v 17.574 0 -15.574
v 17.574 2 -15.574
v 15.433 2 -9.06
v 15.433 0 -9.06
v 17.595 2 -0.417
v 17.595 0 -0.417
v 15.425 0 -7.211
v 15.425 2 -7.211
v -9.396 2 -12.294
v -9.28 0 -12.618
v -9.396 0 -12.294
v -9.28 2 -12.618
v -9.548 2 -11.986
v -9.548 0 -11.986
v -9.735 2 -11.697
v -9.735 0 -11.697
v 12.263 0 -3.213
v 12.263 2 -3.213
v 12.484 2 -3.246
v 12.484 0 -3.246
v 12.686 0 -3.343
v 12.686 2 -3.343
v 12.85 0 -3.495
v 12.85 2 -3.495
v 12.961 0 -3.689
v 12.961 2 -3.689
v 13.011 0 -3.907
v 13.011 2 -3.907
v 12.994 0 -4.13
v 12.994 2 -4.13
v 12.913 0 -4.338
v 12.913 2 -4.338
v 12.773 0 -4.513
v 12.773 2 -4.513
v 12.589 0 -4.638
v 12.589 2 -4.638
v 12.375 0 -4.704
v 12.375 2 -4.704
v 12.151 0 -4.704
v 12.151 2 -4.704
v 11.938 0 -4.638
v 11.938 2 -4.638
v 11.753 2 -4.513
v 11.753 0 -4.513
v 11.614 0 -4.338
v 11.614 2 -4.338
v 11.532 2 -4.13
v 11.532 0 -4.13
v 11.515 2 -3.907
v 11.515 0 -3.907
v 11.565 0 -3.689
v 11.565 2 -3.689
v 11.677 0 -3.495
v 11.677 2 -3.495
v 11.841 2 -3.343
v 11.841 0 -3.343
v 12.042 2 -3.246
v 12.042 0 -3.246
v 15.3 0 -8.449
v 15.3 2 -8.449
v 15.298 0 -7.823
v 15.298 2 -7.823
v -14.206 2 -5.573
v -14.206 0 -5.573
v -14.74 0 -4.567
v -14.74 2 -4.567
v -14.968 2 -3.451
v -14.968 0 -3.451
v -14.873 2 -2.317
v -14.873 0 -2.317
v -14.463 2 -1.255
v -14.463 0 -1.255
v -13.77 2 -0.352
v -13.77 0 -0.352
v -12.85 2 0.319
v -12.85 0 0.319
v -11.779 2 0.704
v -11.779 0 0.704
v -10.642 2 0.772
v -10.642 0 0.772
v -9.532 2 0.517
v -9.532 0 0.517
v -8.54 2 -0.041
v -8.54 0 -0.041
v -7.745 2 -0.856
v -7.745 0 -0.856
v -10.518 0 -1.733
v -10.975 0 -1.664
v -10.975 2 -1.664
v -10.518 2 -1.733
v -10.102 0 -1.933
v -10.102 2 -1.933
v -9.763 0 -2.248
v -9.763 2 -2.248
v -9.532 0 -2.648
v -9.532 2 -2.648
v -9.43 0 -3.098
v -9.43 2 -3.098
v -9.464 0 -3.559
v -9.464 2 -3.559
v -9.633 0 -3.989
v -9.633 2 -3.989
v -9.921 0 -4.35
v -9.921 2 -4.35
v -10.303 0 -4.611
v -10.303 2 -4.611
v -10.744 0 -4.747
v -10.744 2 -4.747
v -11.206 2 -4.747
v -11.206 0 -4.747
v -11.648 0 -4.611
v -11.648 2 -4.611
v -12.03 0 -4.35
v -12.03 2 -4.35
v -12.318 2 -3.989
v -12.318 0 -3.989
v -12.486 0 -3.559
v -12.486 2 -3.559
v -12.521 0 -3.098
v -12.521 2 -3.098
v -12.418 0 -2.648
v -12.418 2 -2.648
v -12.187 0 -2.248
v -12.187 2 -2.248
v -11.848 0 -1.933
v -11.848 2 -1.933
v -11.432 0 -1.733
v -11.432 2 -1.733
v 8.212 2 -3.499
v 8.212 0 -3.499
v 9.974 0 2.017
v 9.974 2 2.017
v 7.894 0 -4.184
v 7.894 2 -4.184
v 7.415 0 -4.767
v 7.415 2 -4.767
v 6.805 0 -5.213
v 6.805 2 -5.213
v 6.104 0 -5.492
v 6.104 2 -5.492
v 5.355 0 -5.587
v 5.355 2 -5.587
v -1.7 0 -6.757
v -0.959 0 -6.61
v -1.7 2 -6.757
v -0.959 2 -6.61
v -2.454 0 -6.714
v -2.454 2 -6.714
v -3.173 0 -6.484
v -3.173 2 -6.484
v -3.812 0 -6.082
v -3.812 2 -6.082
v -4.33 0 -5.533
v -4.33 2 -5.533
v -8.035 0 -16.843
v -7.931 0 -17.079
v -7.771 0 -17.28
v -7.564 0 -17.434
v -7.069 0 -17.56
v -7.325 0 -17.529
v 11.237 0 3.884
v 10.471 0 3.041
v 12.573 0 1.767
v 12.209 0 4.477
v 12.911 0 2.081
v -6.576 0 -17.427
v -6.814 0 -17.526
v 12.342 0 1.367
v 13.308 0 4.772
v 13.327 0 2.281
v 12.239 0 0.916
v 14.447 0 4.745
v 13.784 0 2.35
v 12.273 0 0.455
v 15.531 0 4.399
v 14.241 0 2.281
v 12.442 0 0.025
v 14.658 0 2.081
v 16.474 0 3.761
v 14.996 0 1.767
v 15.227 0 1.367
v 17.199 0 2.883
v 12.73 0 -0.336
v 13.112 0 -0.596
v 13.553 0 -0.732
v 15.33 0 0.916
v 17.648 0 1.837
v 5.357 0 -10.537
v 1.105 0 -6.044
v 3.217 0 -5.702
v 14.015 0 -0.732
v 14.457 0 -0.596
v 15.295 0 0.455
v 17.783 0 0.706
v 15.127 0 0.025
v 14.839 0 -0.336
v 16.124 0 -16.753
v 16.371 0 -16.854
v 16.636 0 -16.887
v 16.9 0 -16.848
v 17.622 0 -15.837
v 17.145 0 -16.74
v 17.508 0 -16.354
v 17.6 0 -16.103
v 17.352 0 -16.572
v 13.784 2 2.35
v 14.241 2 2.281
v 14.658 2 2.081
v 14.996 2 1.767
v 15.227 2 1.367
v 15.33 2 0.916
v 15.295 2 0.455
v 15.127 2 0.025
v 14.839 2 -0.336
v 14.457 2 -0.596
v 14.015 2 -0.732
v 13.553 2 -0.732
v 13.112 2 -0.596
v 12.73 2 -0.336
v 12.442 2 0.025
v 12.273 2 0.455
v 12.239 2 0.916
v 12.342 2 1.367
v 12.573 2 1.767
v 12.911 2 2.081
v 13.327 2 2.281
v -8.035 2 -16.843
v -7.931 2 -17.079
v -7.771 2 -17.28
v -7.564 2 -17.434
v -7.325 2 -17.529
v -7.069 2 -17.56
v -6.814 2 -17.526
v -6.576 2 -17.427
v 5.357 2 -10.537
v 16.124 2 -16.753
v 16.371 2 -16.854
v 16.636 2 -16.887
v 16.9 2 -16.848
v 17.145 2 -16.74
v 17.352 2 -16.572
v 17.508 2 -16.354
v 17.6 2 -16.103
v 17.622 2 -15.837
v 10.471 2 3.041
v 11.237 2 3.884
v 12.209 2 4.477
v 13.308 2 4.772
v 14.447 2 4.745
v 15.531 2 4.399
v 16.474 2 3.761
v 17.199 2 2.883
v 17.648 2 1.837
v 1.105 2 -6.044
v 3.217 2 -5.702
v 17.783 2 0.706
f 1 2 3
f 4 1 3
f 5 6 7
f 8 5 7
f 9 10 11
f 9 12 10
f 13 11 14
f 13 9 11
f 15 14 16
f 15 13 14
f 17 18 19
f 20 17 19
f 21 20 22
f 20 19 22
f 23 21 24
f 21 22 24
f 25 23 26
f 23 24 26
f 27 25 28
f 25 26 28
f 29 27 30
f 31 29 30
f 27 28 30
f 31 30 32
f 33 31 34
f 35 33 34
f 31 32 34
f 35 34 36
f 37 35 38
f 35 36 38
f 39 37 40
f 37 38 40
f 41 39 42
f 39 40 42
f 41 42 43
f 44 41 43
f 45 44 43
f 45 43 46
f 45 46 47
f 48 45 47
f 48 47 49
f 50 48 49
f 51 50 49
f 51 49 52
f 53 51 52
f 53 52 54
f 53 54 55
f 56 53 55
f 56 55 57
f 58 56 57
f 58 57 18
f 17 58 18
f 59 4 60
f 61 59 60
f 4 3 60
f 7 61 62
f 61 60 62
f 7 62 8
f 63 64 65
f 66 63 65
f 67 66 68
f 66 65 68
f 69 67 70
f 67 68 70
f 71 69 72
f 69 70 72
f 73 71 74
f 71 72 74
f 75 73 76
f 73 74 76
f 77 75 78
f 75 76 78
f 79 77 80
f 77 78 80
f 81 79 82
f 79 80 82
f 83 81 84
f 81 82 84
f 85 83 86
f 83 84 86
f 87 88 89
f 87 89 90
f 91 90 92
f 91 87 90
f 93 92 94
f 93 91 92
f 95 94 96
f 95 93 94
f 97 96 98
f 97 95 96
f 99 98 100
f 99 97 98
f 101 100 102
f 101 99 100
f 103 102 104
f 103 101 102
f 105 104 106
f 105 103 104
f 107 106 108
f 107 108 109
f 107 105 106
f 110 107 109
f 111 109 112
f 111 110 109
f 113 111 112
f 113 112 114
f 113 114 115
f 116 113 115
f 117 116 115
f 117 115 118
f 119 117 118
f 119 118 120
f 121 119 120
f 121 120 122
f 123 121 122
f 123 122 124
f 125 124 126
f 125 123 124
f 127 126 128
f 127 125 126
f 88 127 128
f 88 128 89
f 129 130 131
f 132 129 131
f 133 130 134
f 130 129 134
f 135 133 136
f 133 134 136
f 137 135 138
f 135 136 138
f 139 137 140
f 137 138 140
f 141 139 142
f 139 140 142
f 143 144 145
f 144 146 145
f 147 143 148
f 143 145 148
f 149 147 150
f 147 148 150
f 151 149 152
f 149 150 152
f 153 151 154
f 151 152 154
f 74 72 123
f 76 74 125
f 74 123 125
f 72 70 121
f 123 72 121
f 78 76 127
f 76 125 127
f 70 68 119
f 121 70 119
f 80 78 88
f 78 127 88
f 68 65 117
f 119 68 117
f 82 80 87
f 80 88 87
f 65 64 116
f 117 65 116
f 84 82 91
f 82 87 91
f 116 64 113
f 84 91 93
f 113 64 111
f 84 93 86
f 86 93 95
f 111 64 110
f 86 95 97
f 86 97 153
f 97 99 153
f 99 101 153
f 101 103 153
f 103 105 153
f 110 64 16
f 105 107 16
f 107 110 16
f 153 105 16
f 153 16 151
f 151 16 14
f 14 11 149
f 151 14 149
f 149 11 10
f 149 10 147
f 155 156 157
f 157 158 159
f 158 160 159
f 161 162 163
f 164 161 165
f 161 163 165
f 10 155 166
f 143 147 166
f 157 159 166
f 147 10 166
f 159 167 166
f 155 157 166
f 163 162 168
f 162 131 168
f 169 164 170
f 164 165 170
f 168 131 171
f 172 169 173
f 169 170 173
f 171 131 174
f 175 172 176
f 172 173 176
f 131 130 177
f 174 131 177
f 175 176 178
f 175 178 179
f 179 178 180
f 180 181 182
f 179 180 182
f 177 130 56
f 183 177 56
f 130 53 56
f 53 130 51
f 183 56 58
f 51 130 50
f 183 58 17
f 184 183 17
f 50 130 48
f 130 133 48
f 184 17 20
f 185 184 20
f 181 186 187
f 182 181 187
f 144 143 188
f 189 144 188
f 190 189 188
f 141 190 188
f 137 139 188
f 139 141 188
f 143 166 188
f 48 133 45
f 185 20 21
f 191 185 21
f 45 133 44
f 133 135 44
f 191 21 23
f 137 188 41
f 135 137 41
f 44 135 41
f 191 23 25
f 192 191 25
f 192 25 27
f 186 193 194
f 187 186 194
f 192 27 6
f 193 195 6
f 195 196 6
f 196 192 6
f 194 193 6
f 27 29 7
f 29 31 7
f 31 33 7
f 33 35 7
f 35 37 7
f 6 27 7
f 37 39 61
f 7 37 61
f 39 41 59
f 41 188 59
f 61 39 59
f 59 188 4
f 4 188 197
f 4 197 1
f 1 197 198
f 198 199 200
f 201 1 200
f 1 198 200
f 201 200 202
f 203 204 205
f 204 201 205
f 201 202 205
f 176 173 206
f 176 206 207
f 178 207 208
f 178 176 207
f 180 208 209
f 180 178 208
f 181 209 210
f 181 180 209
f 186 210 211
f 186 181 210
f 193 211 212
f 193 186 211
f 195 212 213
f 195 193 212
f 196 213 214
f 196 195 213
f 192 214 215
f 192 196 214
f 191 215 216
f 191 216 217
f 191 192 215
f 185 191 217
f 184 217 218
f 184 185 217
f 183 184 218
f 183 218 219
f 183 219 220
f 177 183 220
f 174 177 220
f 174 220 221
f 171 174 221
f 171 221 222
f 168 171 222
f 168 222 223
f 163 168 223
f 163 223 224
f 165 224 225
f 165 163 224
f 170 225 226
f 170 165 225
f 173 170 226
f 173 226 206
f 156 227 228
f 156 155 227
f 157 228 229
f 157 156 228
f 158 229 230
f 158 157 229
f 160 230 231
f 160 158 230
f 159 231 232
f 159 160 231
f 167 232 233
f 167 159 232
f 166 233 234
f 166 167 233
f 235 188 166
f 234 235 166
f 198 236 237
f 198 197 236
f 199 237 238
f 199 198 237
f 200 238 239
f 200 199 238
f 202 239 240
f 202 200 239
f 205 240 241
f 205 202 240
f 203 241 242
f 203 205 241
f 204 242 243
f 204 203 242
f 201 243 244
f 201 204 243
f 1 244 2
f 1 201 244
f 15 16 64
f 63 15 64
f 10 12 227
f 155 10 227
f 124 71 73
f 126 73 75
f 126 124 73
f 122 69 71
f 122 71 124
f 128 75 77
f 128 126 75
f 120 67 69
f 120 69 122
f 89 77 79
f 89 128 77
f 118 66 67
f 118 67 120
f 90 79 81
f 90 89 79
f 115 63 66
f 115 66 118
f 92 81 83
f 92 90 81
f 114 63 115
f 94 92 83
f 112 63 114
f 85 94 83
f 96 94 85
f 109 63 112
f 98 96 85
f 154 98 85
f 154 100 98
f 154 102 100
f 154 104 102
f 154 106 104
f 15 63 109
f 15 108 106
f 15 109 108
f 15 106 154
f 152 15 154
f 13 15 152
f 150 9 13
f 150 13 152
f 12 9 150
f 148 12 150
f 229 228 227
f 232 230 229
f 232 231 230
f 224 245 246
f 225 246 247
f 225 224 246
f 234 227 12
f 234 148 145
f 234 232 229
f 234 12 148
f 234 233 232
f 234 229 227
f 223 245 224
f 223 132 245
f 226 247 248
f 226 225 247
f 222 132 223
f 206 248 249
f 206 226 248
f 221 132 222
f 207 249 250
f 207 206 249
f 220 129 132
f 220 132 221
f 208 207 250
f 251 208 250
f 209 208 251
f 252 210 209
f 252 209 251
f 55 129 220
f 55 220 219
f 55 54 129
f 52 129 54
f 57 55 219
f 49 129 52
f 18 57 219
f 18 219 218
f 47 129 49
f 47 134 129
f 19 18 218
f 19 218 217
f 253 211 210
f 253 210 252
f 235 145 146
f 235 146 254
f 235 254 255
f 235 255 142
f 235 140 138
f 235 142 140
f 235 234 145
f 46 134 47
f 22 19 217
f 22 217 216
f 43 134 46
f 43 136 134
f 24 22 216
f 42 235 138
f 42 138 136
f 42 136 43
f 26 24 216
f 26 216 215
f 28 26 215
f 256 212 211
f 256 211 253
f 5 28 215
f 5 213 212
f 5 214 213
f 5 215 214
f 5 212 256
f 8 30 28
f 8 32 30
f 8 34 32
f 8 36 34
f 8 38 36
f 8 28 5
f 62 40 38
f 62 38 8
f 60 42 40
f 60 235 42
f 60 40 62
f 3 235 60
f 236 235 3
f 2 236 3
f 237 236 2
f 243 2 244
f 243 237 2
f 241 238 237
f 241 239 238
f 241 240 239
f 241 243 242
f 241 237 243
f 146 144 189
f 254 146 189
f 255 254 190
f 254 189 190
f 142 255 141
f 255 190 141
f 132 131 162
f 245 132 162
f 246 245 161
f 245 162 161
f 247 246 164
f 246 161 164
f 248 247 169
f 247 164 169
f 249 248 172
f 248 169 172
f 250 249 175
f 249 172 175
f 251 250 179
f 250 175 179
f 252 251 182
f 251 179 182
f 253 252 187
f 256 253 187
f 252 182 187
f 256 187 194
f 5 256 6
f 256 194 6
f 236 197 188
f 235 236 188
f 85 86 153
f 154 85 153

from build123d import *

# Parameters (mm, degrees)
SKETCH_1_R          = 1.55
EXTRUDE_1_DEPTH     = 2
CUT_EXTRUDE_2_DEPTH = 33.018928501
EXTRUDE_START       = -2
EXTRUDE_3_DEPTH     = 2
FILLET_1_R          = 3
FILLET_2_R          = 1
SKETCH_5_R          = 0.75
CUT_EXTRUDE_3_DEPTH = 10


with BuildPart() as part:
    # 草图1 → 凸台-拉伸1 (new body)
    with BuildSketch(Plane(origin=(0, 0, 0), x_dir=(1, 0, 0), z_dir=(0, 1, 0))):
        with BuildLine():
            Line((-9.427629845, 12.118007633), (-14.205972572, 5.57250637))
            ThreePointArc((-14.205972572, 5.57250637), (-13.333741258, -0.01669863), (-7.744536258, 0.855532684))
            Line((-7.744536258, 0.855532684), (-2.966193531, 7.401033946))
            ThreePointArc((-2.966193531, 7.401033946), (2.156455687, 5.844533995), (7.508476858, 5.702771934))
            Line((7.508476858, 5.702771934), (9.973957748, -2.017173013))
            ThreePointArc((9.973957748, -2.017173013), (15.001264118, -4.610663069), (17.594754173, 0.416643301))
            Line((17.594754173, 0.416643301), (15.129273283, 8.136588247))
            Line((15.129273283, 8.136588247), (19.53886034, 20.548398832))
            ThreePointArc((19.53886034, 20.548398832), (2.94865648, 10.730730666), (-9.689752685, 25.287244194))
            Line((-9.689752685, 25.287244194), (-9.427629845, 12.118007633))
        make_face()
        with Locations(Location((13.784355961, -0.800264856, 0), (0, 0, 270))):
            Circle(SKETCH_1_R, mode=Mode.SUBTRACT)
        with Locations(Location((-10.975254415, 3.214019527, 0), (0, 0, 270))):
            Circle(SKETCH_1_R, mode=Mode.SUBTRACT)
    extrude(amount=EXTRUDE_1_DEPTH)

    # 草图4 → 切除-拉伸2 (cut, through all)
    with BuildSketch(Plane(origin=(0, 2, 0), x_dir=(1, 0, 0), z_dir=(0, 1, 0))):
        with BuildLine():
            Line((-9.427629845, 12.118007633), (-7.676415353, 18.061742765))
            ThreePointArc((-7.676415353, 18.061742765), (-9.140437111, 21.54705512), (-9.689752685, 25.287244194))
            Line((-9.689752685, 25.287244194), (-9.427629845, 12.118007633))
        make_face()
        with BuildLine():
            ThreePointArc((19.53886034, 20.548398832), (19.021588119, 19.278904179), (18.3909493, 18.061742765))
            Line((18.3909493, 18.061742765), (15.129273283, 8.136588247))
            Line((15.129273283, 8.136588247), (19.53886034, 20.548398832))
        make_face()
    extrude(amount=-CUT_EXTRUDE_2_DEPTH, mode=Mode.SUBTRACT)

    # 草图4<3> → 凸台-拉伸3 (add)
    with BuildSketch(Plane(origin=(0, 2, 0), x_dir=(1, 0, 0), z_dir=(0, 1, 0)).offset(EXTRUDE_START)):
        with BuildLine():
            ThreePointArc((-7.676415353, 18.061742765), (-2.167733027, 12.553060438), (5.357266973, 10.536742765))
            Line((5.357266973, 10.536742765), (-7.676415353, 18.061742765))
        make_face()
        with BuildLine():
            ThreePointArc((5.357266973, 10.536742765), (12.882266973, 12.553060438), (18.3909493, 18.061742765))
            Line((18.3909493, 18.061742765), (5.357266973, 10.536742765))
        make_face()
    extrude(amount=EXTRUDE_3_DEPTH)

    # 圆角1
    fillet_1_edges = [part.edges().sort_by_distance(p)[0] for p in [
        (-9.427629845, 1, -12.118007633),
        (15.129273283, 1, -8.136588247),
        (7.508476858, 1, -5.702771934),
        (-2.966193531, 1, -7.401033946),
    ]]
    fillet(fillet_1_edges, radius=FILLET_1_R)

    # 圆角2
    fillet_2_edges = [part.edges().sort_by_distance(p)[0] for p in [
        (-7.676415353, 1, -18.061742765),
        (18.3909493, 1, -18.061742765),
    ]]
    fillet(fillet_2_edges, radius=FILLET_2_R)

    # 草图5 → 切除-拉伸3 (cut)
    with BuildSketch(Plane(origin=(0, 2, 0), x_dir=(1, 0, 0), z_dir=(0, 1, 0))):
        with Locations(Location((12.263220764, 3.962732909, 0), (0, 0, 270))):
            Circle(SKETCH_5_R)
    extrude(amount=-CUT_EXTRUDE_3_DEPTH, mode=Mode.SUBTRACT)


solid = part.part
